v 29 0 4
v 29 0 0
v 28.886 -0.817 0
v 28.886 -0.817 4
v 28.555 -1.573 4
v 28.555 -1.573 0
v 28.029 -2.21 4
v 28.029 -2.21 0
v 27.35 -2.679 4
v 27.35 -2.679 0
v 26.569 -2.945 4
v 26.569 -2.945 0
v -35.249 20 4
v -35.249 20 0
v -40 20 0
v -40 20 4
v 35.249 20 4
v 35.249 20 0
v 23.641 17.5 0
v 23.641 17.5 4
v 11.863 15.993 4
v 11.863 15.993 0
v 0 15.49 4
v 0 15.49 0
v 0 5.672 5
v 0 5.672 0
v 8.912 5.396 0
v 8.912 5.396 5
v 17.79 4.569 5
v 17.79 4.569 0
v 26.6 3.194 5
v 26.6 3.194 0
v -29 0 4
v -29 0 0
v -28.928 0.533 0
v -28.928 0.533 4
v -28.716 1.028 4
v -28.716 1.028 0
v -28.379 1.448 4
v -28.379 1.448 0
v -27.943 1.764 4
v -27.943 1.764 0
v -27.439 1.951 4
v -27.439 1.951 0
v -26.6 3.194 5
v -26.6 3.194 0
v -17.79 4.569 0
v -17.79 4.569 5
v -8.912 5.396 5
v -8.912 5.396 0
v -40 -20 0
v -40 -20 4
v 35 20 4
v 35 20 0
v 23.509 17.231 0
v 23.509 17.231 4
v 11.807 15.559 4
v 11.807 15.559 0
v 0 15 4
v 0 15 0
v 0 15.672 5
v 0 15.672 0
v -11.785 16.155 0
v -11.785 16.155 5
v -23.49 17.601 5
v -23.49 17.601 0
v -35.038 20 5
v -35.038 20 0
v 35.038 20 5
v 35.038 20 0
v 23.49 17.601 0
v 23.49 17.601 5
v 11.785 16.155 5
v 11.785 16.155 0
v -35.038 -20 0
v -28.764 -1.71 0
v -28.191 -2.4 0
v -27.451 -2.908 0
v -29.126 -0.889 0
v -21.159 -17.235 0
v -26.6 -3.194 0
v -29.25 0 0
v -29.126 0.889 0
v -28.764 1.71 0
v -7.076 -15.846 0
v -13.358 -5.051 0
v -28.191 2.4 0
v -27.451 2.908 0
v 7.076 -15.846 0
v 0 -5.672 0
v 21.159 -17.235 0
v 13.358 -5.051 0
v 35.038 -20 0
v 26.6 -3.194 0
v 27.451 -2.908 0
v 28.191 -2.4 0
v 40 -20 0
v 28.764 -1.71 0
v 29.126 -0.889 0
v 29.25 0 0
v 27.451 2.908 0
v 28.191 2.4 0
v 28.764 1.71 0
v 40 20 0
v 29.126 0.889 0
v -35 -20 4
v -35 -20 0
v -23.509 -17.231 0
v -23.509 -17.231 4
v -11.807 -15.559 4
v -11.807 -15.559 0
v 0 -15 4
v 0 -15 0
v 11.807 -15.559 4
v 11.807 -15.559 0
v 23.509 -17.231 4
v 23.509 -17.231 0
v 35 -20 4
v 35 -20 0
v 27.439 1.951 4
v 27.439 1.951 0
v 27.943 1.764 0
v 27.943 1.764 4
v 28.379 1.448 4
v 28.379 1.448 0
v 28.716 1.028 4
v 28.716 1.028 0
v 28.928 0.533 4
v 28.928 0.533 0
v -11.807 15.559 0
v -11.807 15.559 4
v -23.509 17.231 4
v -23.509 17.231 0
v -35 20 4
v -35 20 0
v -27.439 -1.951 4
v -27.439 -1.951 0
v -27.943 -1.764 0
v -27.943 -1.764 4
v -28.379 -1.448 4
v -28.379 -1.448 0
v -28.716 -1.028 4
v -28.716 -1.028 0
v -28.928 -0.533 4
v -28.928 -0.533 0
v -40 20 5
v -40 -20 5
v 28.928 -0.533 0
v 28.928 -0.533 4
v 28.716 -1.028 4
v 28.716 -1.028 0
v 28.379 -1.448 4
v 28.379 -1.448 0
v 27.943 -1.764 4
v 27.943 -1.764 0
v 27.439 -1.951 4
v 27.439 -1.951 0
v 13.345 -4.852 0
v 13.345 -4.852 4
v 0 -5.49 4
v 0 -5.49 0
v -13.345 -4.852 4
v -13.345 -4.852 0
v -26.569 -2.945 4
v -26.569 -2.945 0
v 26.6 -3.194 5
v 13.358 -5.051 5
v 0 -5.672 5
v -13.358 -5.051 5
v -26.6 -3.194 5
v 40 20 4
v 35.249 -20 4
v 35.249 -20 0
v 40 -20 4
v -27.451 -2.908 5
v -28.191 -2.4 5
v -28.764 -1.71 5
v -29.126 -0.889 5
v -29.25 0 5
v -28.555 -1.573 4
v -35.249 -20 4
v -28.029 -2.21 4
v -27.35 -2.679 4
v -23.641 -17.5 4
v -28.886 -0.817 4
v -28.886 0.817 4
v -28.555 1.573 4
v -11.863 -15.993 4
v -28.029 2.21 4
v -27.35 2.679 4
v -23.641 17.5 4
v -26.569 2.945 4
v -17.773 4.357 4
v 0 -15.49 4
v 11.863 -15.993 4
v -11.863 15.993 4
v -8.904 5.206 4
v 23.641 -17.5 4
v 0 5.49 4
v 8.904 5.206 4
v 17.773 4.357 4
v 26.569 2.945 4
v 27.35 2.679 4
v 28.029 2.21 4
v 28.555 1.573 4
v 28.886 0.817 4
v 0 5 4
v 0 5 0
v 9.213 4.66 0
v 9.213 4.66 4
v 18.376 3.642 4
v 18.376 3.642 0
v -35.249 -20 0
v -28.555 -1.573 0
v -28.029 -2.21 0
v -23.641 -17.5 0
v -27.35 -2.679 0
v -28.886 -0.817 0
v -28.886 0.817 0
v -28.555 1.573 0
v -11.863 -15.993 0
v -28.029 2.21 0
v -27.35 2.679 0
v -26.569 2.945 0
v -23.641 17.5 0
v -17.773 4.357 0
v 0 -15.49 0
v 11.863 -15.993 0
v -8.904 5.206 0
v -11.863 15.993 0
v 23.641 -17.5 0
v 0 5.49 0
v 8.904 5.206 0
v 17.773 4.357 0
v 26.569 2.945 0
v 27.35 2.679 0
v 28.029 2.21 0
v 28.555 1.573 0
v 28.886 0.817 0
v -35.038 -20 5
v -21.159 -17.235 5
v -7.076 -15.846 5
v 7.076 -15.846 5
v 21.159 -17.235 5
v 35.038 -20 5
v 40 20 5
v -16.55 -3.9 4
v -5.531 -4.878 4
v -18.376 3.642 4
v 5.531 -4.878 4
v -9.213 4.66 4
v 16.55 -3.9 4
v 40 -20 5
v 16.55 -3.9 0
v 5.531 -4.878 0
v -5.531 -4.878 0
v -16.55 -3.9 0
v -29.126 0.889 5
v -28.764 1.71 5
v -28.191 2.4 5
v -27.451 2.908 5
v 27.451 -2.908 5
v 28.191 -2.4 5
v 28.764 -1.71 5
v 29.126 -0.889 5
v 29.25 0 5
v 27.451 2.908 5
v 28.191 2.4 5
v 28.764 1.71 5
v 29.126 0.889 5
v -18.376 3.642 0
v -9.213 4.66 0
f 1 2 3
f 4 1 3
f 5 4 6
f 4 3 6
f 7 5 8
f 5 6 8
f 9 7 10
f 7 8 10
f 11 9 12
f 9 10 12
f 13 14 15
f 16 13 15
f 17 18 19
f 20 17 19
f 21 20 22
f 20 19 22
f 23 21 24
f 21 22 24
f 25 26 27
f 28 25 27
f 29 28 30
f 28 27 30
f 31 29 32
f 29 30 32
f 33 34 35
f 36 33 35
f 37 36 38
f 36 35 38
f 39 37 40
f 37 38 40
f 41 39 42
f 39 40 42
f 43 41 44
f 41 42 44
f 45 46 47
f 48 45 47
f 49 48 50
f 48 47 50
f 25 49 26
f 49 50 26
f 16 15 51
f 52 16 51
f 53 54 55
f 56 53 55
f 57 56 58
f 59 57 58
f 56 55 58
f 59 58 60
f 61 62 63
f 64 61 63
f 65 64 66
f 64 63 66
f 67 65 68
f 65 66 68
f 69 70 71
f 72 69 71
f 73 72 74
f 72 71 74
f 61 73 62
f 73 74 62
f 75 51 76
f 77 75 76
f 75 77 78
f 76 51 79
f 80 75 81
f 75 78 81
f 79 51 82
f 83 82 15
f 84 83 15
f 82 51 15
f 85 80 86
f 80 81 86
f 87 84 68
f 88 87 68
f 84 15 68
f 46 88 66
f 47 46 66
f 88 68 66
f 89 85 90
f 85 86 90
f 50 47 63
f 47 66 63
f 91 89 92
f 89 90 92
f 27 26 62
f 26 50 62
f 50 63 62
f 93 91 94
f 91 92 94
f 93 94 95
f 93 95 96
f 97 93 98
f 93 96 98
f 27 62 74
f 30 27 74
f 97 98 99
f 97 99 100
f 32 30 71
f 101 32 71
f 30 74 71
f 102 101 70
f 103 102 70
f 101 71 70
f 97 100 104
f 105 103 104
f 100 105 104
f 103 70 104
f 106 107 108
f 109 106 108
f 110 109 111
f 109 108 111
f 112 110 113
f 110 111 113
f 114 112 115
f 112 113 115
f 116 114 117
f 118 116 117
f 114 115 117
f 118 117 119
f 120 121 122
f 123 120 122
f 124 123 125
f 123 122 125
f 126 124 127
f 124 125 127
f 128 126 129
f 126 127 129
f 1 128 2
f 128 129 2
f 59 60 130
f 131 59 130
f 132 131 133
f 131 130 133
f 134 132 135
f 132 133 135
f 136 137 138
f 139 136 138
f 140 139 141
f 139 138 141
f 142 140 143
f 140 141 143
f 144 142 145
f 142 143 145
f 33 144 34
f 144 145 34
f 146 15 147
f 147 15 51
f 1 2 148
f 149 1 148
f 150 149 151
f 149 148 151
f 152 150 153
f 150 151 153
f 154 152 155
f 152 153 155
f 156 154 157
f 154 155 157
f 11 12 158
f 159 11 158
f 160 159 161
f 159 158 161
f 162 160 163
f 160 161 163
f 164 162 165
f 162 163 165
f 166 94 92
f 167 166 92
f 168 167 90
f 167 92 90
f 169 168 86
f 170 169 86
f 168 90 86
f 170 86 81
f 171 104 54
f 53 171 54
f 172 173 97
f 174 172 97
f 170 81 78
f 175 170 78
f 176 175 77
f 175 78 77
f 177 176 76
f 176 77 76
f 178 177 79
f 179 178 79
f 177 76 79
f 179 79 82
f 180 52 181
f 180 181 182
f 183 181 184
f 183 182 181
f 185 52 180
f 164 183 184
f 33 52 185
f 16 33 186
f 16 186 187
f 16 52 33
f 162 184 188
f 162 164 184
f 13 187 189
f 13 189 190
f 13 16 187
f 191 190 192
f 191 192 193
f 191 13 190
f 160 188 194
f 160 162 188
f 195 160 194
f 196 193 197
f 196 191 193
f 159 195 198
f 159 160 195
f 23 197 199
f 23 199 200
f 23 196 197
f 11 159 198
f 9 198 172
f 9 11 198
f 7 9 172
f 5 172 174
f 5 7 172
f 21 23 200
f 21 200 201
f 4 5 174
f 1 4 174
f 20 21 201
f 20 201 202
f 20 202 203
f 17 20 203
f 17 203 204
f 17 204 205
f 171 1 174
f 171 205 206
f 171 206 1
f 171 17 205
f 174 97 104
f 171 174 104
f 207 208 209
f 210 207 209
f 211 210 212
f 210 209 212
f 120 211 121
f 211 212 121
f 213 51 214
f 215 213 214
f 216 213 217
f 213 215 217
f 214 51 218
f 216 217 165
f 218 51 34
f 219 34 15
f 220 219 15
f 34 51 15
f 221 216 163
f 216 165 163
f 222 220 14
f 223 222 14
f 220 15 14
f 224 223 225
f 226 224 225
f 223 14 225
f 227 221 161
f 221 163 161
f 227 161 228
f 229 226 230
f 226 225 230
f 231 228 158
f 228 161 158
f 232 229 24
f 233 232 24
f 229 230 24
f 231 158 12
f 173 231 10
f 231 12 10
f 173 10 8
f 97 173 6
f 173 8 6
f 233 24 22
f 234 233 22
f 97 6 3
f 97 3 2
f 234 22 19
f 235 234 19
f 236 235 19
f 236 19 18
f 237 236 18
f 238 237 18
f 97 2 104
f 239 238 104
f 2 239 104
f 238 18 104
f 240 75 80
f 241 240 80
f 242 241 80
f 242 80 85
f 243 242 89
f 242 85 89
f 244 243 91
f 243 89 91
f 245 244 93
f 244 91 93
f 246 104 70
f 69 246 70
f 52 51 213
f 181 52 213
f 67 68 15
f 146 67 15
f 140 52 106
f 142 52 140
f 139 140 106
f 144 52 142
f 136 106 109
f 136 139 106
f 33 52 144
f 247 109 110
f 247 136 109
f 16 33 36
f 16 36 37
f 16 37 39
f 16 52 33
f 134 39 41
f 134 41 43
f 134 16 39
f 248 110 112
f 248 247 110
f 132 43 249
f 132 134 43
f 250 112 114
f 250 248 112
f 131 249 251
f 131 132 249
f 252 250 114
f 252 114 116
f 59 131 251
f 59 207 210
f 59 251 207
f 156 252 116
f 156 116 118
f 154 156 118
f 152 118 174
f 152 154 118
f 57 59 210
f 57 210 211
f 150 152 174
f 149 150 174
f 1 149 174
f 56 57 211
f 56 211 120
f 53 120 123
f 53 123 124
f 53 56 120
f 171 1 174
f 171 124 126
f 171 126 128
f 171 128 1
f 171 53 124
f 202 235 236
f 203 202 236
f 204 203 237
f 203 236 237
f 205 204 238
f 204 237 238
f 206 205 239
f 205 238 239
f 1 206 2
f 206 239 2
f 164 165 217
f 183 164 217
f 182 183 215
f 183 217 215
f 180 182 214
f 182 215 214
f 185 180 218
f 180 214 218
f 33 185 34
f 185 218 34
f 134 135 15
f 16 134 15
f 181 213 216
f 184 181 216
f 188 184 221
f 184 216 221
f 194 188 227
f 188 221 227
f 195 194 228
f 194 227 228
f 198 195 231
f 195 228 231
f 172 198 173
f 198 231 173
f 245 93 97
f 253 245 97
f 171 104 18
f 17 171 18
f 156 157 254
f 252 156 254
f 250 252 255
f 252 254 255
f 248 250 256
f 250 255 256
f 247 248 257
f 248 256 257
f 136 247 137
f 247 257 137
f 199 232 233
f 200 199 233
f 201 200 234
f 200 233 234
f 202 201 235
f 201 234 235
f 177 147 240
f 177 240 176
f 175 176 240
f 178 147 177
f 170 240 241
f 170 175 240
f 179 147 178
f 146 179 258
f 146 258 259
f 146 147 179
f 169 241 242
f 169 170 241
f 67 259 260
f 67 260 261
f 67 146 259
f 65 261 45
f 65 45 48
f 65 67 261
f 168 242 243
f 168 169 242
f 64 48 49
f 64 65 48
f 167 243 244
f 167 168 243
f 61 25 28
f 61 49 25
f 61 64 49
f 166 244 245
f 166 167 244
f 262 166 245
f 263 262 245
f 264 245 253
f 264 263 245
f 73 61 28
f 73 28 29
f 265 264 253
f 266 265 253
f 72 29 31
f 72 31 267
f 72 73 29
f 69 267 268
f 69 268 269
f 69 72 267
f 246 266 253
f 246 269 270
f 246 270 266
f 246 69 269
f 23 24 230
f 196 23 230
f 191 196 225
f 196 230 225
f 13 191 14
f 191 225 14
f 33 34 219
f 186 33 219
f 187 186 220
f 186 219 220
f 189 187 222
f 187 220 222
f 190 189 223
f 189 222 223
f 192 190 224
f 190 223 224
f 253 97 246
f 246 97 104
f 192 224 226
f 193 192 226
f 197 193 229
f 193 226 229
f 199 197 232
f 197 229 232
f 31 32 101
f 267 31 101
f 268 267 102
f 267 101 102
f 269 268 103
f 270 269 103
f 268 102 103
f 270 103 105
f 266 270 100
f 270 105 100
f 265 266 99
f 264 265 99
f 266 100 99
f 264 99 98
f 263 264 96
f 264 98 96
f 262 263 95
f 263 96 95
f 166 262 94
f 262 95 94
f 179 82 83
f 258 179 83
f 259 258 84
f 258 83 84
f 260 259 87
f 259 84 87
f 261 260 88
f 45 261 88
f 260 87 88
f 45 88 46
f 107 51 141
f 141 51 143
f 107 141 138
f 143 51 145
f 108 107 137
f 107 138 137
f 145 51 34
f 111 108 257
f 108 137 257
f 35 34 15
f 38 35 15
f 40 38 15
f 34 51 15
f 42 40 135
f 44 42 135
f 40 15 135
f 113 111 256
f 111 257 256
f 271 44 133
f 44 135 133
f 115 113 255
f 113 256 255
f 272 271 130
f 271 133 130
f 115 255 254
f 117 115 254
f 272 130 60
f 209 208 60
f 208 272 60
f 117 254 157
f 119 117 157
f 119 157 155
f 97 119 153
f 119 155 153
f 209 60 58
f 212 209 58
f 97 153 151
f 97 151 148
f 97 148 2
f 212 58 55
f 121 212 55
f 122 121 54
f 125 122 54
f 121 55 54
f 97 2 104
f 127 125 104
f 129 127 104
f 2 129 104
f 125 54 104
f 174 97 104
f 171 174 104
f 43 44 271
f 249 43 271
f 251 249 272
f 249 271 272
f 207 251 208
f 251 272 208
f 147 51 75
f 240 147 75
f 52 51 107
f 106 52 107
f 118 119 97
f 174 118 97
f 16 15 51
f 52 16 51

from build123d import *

# Parameters (mm, degrees)
F2_DEPTH = 4
F3_DEPTH = 5
F5_DEPTH = 4


with BuildPart() as f2:
    # F0 (on Top) → F2 (new body)
    with BuildSketch(Plane.XY):
        with BuildLine():
            Line((0, 5.489777), (0, 15.489777))
            ThreePointArc((0, 15.489777), (-17.768387, 16.621911), (-35.249401, 20))
            Line((-35.249401, 20), (-40, 20))
            Line((-40, 20), (-40, 0))
            Line((-40, 0), (-29, 0))
            ThreePointArc((-29, 0), (-28.313874, 1.909446), (-26.569343, 2.945479))
            ThreePointArc((-26.569343, 2.945479), (-13.345443, 4.852251), (0, 5.489777))
        make_face()
        with BuildLine():
            Line((35.249401, -20), (40, -20))
            Line((40, -20), (40, 20))
            Line((40, 20), (35.249401, 20))
            ThreePointArc((35.249401, 20), (17.768387, 16.621911), (0, 15.489777))
            Line((0, 15.489777), (0, 5.489777))
            ThreePointArc((0, 5.489777), (13.345443, 4.852251), (26.569343, 2.945479))
            ThreePointArc((26.569343, 2.945479), (28.313874, 1.909446), (29, 0))
            ThreePointArc((29, 0), (28.313874, -1.909446), (26.569343, -2.945479))
            ThreePointArc((26.569343, -2.945479), (0, -5.489777), (-26.569343, -2.945479))
            ThreePointArc((-26.569343, -2.945479), (-28.313874, -1.909446), (-29, 0))
            Line((-29, 0), (-40, 0))
            Line((-40, 0), (-40, -20))
            Line((-40, -20), (-35.249401, -20))
            ThreePointArc((-35.249401, -20), (0, -15.489777), (35.249401, -20))
        make_face()
    extrude(amount=F2_DEPTH)


with BuildPart() as f3:
    # F1 (on Top) → F3 (new body)
    with BuildSketch(Plane.XY):
        with BuildLine():
            Line((35.03796, -20), (40, -20))
            Line((40, -20), (40, 20))
            Line((40, 20), (35.03796, 20))
            ThreePointArc((35.03796, 20), (17.65211, 16.758293), (0, 15.672264))
            Line((0, 15.672264), (0, 5.672264))
            ThreePointArc((0, 5.672264), (13.357773, 5.051377), (26.600355, 3.194069))
            ThreePointArc((26.600355, 3.194069), (29.25, 0), (26.600355, -3.194069))
            ThreePointArc((26.600355, -3.194069), (0, -5.672264), (-26.600355, -3.194069))
            ThreePointArc((-26.600355, -3.194069), (-28.501365, -2.075012), (-29.25, 0))
            Line((-29.25, 0), (-40, 0))
            Line((-40, 0), (-40, -20))
            Line((-40, -20), (-35.03796, -20))
            ThreePointArc((-35.03796, -20), (0, -15.672264), (35.03796, -20))
        make_face()
        with BuildLine():
            Line((0, 5.672264), (0, 15.672264))
            ThreePointArc((0, 15.672264), (-17.65211, 16.758293), (-35.03796, 20))
            Line((-35.03796, 20), (-40, 20))
            Line((-40, 20), (-40, 0))
            Line((-40, 0), (-29.25, 0))
            ThreePointArc((-29.25, 0), (-28.501365, 2.075012), (-26.600355, 3.194069))
            ThreePointArc((-26.600355, 3.194069), (-13.357773, 5.051377), (0, 5.672264))
        make_face()
    extrude(amount=F3_DEPTH)


with BuildPart() as f5:
    # F4 (on Top) → F5 (new body)
    with BuildSketch(Plane.XY):
        with BuildLine():
            Line((35, -20), (40, -20))
            Line((40, -20), (40, 20))
            Line((40, 20), (35, 20))
            ThreePointArc((35, 20), (17.67767, 16.256313), (0, 15))
            Line((0, 15), (0, 5))
            ThreePointArc((0, 5), (13.803941, 4.235467), (27.439024, 1.95122))
            ThreePointArc((27.439024, 1.95122), (28.561738, 1.24939), (29, 0))
            ThreePointArc((29, 0), (28.561738, -1.24939), (27.439024, -1.95122))
            ThreePointArc((27.439024, -1.95122), (0, -5), (-27.439024, -1.95122))
            ThreePointArc((-27.439024, -1.95122), (-28.561738, -1.24939), (-29, 0))
            Line((-29, 0), (-40, 0))
            Line((-40, 0), (-40, -20))
            Line((-40, -20), (-35, -20))
            ThreePointArc((-35, -20), (0, -15), (35, -20))
        make_face()
        with BuildLine():
            Line((0, 5), (0, 15))
            ThreePointArc((0, 15), (-17.67767, 16.256313), (-35, 20))
            Line((-35, 20), (-40, 20))
            Line((-40, 20), (-40, 0))
            Line((-40, 0), (-29, 0))
            ThreePointArc((-29, 0), (-28.561738, 1.24939), (-27.439024, 1.95122))
            ThreePointArc((-27.439024, 1.95122), (-13.803941, 4.235467), (0, 5))
        make_face()
    extrude(amount=F5_DEPTH)


solid = Compound([f2.part, f3.part, f5.part])
